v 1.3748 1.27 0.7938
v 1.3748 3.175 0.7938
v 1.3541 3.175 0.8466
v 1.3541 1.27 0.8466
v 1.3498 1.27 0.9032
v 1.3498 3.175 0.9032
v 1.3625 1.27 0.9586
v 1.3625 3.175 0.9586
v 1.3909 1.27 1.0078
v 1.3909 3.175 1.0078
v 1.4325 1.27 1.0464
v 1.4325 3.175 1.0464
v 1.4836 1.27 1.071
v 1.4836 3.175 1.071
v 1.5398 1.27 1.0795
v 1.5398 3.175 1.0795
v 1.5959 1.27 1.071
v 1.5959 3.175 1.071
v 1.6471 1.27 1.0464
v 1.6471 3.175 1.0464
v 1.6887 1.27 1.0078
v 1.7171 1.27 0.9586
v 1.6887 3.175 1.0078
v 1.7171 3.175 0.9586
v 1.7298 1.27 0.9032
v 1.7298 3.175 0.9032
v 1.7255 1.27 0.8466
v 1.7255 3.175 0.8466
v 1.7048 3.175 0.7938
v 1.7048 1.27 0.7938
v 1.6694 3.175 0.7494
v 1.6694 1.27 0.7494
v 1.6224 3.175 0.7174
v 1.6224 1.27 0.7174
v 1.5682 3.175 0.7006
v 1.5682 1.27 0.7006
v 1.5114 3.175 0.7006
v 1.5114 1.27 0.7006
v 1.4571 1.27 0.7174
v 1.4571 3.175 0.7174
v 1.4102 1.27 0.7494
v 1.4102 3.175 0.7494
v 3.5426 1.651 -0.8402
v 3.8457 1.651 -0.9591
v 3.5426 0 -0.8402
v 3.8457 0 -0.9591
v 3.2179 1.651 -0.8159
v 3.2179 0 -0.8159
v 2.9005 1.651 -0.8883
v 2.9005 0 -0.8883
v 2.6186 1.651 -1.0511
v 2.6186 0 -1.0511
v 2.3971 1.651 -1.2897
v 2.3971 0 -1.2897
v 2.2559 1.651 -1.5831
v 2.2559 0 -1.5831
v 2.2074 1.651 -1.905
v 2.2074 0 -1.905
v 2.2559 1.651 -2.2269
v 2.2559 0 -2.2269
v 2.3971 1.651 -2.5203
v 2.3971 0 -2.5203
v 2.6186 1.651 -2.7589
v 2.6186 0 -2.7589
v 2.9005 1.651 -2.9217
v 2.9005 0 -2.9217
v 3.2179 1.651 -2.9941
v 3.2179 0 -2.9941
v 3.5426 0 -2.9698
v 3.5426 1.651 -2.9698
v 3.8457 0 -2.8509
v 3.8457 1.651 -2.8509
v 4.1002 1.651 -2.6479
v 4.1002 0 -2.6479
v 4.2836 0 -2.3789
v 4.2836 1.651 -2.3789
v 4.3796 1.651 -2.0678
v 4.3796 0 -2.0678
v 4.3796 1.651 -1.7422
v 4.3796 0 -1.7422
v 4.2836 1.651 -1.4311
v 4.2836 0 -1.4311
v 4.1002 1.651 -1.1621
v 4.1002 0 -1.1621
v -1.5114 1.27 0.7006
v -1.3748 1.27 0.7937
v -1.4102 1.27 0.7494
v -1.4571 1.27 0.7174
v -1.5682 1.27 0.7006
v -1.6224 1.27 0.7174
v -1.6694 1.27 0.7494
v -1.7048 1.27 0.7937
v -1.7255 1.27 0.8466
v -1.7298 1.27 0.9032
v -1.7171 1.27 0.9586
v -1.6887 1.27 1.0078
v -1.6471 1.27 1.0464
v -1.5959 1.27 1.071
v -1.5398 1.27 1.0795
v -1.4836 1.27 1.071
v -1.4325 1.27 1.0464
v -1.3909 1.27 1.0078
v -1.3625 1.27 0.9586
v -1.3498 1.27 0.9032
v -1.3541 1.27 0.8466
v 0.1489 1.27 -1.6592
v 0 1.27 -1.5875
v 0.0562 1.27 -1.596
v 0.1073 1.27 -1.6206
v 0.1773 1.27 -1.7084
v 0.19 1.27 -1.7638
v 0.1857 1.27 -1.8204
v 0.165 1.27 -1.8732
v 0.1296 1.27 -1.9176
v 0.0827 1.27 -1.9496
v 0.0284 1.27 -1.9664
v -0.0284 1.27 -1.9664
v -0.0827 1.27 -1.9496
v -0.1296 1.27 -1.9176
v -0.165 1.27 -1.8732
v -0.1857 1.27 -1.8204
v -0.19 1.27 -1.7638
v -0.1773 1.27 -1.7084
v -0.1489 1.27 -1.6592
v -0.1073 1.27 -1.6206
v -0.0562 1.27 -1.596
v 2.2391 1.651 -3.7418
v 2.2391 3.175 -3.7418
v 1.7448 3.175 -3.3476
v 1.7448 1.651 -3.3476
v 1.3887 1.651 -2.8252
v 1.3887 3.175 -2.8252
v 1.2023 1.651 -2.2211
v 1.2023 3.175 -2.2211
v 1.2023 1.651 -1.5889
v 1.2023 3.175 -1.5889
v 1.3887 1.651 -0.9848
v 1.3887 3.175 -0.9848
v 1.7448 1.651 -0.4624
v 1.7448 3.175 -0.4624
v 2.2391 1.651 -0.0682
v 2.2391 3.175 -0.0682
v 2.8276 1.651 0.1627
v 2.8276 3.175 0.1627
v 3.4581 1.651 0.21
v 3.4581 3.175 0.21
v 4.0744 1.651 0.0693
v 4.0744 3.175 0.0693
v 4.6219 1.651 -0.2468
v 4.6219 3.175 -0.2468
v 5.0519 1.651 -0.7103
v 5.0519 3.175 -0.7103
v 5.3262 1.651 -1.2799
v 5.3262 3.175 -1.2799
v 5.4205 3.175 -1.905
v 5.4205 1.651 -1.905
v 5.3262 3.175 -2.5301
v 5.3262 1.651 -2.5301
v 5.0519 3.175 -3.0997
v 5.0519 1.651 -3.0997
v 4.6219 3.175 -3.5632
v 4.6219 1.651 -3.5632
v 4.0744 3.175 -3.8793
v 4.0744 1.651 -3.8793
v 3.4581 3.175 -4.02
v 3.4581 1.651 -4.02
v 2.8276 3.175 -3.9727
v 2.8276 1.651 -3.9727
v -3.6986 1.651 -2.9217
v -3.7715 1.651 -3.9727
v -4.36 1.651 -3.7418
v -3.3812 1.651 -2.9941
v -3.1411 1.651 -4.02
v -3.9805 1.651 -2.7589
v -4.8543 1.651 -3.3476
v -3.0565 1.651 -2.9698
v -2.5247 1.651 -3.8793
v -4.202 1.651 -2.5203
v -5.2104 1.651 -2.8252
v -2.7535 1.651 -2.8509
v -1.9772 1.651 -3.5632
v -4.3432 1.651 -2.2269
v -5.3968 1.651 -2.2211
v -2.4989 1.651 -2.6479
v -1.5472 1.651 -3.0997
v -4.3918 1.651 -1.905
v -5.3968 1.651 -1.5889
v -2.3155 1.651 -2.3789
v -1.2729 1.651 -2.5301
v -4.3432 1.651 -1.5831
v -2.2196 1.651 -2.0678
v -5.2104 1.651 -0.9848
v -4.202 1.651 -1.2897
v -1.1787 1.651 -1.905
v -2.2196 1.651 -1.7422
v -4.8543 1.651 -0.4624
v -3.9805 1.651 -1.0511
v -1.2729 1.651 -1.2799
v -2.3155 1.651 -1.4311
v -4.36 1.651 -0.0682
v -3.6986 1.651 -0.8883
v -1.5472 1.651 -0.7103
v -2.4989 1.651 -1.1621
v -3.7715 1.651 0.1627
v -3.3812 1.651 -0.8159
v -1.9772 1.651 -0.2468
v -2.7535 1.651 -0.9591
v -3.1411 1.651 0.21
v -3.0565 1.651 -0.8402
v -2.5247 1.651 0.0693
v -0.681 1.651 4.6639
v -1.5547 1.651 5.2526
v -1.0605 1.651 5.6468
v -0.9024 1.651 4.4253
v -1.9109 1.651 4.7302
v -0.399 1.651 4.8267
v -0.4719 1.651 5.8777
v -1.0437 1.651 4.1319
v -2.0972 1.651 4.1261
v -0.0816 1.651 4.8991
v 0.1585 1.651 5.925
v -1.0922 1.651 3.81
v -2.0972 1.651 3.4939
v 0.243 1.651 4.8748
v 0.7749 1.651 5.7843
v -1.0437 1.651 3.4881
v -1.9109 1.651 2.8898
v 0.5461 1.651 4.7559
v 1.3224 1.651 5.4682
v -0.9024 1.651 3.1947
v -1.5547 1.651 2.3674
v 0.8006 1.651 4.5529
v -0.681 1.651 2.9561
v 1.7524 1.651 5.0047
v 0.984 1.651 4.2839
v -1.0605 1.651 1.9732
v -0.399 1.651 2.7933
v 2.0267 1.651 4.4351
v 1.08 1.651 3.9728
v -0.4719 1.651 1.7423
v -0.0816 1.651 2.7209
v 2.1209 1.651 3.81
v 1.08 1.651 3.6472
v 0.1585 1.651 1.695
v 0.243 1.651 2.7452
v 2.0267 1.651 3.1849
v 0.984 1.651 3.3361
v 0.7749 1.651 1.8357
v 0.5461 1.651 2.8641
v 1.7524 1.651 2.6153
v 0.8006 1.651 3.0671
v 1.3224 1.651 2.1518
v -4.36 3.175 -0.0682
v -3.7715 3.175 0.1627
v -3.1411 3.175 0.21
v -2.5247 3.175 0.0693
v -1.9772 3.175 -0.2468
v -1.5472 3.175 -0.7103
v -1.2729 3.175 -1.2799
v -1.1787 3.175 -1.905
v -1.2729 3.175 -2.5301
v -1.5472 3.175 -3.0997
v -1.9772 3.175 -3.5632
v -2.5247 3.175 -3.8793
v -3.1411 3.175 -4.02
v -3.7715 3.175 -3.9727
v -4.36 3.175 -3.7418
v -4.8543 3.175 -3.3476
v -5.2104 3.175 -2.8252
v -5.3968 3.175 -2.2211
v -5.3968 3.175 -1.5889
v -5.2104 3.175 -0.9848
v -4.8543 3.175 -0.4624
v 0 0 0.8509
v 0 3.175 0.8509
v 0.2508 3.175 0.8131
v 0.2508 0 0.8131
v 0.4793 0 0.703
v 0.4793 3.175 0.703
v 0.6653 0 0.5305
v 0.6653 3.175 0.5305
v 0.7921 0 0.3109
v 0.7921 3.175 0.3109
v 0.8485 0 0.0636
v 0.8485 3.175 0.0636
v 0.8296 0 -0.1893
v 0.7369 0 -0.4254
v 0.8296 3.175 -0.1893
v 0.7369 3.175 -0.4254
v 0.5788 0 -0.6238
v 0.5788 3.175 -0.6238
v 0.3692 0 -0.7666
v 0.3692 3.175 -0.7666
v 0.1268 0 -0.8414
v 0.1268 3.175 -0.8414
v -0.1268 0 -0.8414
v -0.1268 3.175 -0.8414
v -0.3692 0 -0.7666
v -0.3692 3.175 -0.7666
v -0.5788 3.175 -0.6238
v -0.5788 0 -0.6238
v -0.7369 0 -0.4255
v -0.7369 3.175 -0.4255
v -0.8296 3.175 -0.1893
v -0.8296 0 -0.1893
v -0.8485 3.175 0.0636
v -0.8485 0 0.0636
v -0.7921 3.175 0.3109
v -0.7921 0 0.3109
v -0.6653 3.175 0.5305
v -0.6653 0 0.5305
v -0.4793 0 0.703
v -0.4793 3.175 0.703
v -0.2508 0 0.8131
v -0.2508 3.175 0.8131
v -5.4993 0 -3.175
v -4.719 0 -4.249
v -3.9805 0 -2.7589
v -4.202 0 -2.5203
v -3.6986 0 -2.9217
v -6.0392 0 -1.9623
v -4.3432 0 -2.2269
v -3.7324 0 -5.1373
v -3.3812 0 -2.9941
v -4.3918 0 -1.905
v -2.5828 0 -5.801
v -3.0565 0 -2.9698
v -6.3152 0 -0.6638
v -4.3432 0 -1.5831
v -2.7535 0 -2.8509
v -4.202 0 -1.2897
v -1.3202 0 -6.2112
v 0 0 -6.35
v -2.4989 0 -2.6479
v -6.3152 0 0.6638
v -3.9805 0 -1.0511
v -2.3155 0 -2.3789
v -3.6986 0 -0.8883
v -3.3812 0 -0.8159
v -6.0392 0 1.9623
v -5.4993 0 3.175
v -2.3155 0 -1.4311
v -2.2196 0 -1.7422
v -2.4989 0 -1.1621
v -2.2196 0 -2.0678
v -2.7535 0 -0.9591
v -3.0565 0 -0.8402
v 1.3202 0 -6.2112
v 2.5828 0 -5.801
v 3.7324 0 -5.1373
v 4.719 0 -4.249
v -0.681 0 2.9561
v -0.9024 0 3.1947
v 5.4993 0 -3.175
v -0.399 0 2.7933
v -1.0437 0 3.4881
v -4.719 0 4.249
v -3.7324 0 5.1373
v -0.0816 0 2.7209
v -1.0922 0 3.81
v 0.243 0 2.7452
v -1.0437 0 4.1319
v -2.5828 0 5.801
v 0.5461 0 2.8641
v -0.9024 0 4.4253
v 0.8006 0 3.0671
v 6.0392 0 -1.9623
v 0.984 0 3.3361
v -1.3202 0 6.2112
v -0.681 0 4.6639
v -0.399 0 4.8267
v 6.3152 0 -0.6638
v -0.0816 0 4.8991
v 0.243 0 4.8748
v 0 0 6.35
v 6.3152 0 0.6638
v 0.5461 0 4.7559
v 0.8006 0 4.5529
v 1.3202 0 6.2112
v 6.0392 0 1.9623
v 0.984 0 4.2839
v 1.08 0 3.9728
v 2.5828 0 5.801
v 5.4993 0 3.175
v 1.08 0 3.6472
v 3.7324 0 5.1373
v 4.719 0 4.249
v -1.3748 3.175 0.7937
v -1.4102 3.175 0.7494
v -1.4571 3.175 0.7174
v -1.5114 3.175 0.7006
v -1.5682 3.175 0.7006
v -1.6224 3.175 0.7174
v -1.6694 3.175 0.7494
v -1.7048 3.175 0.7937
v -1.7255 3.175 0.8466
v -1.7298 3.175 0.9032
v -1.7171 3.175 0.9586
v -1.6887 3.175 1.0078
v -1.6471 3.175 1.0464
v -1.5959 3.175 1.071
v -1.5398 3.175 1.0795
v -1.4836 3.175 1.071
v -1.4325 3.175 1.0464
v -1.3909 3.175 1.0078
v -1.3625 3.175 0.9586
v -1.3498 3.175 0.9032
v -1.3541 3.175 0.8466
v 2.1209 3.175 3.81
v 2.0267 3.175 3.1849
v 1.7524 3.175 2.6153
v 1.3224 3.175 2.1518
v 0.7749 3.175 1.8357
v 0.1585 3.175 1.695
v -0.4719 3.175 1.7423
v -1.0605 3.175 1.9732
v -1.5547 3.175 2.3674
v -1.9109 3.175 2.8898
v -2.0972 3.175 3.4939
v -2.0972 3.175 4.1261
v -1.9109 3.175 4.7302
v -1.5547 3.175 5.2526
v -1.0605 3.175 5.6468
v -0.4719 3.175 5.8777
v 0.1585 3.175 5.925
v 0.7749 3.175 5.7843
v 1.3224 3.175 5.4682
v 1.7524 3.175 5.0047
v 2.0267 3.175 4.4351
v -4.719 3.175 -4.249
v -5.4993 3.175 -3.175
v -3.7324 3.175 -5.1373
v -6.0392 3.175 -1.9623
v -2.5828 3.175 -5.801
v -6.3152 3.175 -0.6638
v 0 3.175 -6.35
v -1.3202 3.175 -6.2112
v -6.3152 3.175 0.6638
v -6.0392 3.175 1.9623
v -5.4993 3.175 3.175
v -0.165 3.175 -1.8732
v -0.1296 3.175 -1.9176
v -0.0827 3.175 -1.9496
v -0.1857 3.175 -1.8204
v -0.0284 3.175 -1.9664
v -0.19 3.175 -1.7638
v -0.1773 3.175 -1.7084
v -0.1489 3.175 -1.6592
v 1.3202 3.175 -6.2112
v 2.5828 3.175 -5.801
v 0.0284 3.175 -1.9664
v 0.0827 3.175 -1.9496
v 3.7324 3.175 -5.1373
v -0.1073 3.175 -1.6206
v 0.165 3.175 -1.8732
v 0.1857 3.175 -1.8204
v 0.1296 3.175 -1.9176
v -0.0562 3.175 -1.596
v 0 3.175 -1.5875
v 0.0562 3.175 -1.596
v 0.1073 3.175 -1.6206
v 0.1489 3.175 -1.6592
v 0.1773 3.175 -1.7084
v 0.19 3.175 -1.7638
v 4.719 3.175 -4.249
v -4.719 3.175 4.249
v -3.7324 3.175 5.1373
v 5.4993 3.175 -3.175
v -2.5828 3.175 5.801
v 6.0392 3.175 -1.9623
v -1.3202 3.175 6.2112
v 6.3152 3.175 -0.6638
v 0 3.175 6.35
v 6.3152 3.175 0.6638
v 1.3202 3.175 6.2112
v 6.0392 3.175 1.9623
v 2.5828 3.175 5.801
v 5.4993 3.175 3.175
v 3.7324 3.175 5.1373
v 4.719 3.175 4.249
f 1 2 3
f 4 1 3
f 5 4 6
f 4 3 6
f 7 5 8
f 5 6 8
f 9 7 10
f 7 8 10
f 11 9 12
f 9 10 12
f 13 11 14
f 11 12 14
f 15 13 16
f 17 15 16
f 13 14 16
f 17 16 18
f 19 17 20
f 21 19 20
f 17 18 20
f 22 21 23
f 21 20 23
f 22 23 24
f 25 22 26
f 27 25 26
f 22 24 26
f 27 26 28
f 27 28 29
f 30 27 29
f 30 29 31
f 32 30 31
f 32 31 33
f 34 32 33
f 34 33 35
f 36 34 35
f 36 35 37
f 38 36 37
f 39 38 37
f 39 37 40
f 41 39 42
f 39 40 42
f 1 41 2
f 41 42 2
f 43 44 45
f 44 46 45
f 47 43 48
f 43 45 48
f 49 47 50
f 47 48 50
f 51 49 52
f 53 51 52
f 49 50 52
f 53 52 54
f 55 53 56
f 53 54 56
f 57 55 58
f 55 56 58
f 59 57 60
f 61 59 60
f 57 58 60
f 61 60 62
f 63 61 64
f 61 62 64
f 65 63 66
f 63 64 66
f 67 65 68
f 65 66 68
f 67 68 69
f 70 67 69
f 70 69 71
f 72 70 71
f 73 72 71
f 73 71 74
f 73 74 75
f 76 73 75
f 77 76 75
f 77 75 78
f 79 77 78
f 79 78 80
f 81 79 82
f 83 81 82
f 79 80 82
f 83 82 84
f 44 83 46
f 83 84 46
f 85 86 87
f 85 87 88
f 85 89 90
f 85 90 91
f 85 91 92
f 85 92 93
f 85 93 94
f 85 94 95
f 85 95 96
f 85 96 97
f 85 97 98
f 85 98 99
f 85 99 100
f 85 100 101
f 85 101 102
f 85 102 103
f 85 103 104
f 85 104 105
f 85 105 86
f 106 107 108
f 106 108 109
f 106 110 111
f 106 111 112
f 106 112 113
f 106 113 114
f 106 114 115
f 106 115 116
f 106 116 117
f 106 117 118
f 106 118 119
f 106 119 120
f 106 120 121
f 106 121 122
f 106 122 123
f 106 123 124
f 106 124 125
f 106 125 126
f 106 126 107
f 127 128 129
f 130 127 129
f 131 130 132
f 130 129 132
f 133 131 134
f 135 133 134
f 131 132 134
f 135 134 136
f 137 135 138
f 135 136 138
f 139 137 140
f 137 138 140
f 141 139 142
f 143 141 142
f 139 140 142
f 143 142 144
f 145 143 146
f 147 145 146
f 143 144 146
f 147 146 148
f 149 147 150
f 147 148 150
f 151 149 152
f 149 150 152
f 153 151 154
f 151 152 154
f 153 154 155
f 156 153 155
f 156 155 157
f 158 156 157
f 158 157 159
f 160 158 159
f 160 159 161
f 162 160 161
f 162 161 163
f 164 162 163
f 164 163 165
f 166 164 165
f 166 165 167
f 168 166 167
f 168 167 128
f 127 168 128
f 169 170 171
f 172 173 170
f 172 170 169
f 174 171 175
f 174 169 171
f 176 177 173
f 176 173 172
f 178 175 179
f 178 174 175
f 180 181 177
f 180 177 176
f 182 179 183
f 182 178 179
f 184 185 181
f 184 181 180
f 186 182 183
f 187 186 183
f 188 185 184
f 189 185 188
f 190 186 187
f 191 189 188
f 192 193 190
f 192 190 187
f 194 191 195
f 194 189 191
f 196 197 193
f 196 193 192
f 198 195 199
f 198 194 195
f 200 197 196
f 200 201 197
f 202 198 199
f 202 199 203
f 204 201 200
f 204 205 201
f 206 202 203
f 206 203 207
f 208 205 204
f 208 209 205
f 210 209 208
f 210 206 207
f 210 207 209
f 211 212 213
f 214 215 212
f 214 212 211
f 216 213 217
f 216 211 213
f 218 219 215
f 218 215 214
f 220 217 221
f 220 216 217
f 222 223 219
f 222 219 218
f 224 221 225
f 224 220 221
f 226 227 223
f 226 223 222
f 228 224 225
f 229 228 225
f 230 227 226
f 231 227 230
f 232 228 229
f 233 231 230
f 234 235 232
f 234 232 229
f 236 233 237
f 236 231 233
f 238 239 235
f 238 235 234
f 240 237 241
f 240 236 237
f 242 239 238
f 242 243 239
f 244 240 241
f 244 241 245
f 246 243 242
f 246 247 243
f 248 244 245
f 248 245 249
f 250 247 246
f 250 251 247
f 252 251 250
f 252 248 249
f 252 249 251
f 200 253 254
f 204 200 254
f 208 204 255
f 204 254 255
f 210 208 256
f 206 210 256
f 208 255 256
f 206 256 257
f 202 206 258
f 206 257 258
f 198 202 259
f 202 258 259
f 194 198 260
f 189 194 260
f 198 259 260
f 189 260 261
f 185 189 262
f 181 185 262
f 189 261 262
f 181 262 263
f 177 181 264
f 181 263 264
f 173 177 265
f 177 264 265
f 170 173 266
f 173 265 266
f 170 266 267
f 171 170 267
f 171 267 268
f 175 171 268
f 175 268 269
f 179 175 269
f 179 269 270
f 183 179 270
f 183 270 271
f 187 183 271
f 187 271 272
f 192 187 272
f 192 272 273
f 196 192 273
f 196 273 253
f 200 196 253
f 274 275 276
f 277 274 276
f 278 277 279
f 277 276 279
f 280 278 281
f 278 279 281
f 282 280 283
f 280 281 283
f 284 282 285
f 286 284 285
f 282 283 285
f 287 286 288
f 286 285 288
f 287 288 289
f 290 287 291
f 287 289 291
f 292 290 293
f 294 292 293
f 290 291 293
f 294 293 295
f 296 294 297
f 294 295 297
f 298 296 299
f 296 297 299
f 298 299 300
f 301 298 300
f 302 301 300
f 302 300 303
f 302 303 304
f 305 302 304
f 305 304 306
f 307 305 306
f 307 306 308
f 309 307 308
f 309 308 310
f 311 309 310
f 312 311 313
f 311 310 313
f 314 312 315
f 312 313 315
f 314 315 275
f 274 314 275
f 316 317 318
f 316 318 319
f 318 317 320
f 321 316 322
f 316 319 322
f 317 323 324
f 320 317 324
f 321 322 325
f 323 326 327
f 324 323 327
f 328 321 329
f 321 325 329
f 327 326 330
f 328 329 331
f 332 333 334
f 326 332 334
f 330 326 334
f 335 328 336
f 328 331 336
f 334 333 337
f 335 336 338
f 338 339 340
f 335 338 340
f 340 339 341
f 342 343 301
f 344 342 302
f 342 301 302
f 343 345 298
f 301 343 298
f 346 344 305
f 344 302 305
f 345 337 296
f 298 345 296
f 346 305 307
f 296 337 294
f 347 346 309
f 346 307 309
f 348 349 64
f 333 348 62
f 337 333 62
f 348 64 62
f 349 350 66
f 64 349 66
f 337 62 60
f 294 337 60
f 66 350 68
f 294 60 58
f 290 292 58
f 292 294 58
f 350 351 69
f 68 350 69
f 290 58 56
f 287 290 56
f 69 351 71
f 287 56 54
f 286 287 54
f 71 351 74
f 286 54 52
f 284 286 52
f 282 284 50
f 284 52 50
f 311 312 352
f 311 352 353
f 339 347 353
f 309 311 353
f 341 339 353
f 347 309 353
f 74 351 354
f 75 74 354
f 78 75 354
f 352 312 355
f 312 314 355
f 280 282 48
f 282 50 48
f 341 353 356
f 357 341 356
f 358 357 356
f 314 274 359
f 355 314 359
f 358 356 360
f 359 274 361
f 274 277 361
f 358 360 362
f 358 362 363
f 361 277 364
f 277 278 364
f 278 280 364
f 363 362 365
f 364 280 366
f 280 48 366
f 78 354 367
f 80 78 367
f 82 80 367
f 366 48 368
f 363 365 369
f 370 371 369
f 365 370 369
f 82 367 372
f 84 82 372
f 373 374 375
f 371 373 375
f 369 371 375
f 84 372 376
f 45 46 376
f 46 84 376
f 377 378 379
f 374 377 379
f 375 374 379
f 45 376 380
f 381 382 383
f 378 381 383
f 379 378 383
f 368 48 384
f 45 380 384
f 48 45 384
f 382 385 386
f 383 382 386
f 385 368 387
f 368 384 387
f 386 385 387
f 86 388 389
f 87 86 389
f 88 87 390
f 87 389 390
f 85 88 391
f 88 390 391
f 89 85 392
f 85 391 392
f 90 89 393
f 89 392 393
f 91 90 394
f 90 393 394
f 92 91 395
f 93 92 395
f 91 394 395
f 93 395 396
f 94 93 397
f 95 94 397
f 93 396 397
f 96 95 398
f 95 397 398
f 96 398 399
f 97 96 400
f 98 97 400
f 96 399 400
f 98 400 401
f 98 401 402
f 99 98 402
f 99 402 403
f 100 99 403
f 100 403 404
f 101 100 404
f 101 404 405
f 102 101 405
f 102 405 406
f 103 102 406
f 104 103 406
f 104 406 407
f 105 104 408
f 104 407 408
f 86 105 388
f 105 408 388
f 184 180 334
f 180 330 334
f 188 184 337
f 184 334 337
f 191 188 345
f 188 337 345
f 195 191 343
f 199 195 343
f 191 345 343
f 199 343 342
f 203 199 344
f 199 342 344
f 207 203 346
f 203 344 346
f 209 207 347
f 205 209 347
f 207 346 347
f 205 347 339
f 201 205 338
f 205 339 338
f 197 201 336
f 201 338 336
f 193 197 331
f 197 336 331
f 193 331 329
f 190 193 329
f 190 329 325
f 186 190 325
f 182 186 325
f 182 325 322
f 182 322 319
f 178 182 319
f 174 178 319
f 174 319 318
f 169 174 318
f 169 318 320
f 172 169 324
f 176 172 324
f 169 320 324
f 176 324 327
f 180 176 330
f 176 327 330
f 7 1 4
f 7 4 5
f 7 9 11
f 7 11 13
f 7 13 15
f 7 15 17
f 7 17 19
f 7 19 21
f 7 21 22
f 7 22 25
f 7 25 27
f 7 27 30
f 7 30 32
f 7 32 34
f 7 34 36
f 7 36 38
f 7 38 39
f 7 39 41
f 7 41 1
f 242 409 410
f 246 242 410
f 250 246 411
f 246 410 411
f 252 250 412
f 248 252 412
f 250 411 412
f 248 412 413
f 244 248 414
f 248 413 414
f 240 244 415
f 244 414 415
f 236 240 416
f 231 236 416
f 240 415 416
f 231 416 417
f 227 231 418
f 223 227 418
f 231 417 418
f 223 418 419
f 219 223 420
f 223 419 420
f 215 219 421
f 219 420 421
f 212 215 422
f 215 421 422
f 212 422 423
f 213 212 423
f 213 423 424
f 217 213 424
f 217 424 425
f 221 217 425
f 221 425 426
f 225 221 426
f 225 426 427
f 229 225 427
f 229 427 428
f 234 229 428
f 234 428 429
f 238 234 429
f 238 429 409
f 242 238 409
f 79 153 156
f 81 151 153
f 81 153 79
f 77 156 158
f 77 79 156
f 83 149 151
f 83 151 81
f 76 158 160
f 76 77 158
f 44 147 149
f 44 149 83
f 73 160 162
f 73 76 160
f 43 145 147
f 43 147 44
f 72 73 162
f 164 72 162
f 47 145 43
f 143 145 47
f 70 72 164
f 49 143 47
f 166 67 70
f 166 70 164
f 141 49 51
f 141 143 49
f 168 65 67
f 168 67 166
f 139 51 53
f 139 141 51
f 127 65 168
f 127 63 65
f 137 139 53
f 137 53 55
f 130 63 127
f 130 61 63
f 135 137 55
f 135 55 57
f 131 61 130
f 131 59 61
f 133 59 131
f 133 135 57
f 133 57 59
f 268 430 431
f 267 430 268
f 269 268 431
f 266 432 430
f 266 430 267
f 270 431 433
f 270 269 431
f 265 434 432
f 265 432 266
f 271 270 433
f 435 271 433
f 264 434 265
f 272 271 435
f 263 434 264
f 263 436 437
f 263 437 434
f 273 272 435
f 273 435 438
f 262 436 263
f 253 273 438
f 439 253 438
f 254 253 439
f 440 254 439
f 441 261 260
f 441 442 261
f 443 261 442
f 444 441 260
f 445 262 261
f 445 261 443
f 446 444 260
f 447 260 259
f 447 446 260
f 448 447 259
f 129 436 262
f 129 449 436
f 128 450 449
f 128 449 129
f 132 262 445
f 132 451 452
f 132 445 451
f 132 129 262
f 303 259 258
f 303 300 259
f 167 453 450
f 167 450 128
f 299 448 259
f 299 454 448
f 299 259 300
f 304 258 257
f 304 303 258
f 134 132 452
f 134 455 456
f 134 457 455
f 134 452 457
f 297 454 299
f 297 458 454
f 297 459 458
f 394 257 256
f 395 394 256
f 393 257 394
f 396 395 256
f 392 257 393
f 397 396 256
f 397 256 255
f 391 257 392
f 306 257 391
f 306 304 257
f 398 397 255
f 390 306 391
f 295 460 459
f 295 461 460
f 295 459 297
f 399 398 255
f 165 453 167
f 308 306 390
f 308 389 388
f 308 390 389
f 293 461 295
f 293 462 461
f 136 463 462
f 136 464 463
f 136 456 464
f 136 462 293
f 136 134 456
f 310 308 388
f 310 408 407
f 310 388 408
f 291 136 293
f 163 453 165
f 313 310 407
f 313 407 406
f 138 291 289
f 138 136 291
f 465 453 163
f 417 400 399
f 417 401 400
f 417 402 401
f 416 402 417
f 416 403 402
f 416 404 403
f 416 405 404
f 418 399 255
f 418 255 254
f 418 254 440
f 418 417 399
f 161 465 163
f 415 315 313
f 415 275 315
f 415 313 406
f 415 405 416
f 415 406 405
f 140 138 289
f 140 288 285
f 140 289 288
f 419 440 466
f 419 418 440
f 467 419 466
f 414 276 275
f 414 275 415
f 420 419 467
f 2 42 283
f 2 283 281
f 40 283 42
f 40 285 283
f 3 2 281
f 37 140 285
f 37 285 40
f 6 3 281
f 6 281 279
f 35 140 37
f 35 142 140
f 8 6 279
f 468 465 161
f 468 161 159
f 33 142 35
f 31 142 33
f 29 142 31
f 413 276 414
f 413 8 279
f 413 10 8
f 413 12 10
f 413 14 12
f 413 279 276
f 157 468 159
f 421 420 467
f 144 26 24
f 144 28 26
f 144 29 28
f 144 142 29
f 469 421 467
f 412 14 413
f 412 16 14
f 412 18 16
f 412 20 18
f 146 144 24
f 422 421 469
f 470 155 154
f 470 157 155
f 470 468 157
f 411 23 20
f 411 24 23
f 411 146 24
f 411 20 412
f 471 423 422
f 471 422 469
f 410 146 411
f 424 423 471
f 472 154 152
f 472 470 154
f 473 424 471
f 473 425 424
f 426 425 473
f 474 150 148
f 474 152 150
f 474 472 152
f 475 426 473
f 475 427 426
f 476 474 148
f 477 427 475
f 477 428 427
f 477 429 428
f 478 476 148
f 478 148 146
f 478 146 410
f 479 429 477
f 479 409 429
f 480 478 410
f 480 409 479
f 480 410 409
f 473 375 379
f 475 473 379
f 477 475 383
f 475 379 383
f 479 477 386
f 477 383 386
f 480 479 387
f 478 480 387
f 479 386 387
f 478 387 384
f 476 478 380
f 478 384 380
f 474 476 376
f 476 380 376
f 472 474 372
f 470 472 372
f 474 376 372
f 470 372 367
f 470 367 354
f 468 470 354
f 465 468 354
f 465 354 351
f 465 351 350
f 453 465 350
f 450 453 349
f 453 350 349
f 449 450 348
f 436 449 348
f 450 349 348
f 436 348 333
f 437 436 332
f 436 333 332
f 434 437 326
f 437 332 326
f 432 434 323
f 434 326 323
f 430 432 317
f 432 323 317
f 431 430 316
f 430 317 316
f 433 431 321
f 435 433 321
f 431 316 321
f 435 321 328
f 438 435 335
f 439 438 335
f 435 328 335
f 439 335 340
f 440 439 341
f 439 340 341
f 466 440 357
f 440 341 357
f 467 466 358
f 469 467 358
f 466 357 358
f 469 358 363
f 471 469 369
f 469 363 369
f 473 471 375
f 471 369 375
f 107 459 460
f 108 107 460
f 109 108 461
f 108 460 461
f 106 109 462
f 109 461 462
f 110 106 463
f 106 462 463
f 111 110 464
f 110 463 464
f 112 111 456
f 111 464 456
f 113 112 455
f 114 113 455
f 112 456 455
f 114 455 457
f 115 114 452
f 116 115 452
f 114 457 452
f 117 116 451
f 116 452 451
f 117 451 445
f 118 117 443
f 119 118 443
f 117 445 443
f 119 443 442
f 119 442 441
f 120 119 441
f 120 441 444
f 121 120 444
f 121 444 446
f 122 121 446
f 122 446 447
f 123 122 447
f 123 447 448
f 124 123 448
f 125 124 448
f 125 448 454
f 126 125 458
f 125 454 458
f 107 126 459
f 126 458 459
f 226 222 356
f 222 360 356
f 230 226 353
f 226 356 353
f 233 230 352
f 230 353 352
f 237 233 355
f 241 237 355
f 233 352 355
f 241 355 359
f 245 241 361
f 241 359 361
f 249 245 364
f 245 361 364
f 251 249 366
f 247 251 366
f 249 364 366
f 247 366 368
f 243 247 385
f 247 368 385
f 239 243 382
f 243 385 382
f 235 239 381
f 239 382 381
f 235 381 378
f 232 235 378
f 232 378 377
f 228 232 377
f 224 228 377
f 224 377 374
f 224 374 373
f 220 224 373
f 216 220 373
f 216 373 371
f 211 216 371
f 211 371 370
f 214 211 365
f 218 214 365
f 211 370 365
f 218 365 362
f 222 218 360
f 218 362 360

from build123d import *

# Parameters (mm, degrees)
SKETCH1_R                                           = 6.35
BOSS_EXTRUDE1_DEPTH                                 = 3.175
SKETCH5_R                                           = 0.1905
CUT_EXTRUDE3_DEPTH                                  = 1.905
CIRPATTERN3_COUNT                                   = 3
SKETCH6_R                                           = 0.8509
CUT_EXTRUDE4_DEPTH                                  = 3.175
CBORE_FOR_2_BINDING_HEAD_MACHINE_SCREW1_D           = 2.1844
CBORE_FOR_2_BINDING_HEAD_MACHINE_SCREW1_CBORE_D     = 4.2418
CBORE_FOR_2_BINDING_HEAD_MACHINE_SCREW1_CBORE_DEPTH = 1.524
CIRPATTERN4_COUNT                                   = 3


with BuildPart() as part:
    # Sketch1 → Boss-Extrude1 (new body)
    with BuildSketch(Plane(origin=(0, 0, 0), x_dir=(1, 0, 0), z_dir=(0, 1, 0))):
        with Locations(Location((0, 0, 0), (0, 0, 270))):
            Circle(SKETCH1_R)
    extrude(amount=BOSS_EXTRUDE1_DEPTH)

    # Sketch5 → Cut-Extrude3 (cut)
    with BuildSketch(Plane(origin=(0, 3.175, 0), x_dir=(1, 0, 0), z_dir=(0, 1, 0))):
        with Locations(Location((0, 1.778, 0), (0, 0, 270))):
            Circle(SKETCH5_R)
    cut_extrude3 = extrude(amount=-CUT_EXTRUDE3_DEPTH, mode=Mode.SUBTRACT)

    # CirPattern3: Cut-Extrude3 ×3 about axis
    cirpattern3_axis = Axis((0, 0, 0), (0, 1, 0))
    for i in range(1, CIRPATTERN3_COUNT):
        add(cut_extrude3.rotate(cirpattern3_axis, i * 360 / CIRPATTERN3_COUNT), mode=Mode.SUBTRACT)

    # Sketch6 → Cut-Extrude4 (cut)
    with BuildSketch(Plane(origin=(0, 3.175, 0), x_dir=(1, 0, 0), z_dir=(0, 1, 0))):
        with Locations(Location((0, 0, 0), (0, 0, 270))):
            Circle(SKETCH6_R)
    extrude(amount=-CUT_EXTRUDE4_DEPTH, mode=Mode.SUBTRACT)

    # CBORE for #2 Binding Head Machine Screw1 (through all)
    with Locations(Plane(origin=(0, 3.175, 0), x_dir=(1, 0, 0), z_dir=(0, 1, 0))):
        with Locations((0, -3.81)):
            cbore_for_2_binding_head_machine_screw1 = CounterBoreHole(CBORE_FOR_2_BINDING_HEAD_MACHINE_SCREW1_D / 2, CBORE_FOR_2_BINDING_HEAD_MACHINE_SCREW1_CBORE_D / 2, CBORE_FOR_2_BINDING_HEAD_MACHINE_SCREW1_CBORE_DEPTH)

    # CirPattern4: CBORE for #2 Binding Head Machine Screw1 ×3 about axis
    cirpattern4_axis = Axis((0, 0, 0), (0, 1, 0))
    for i in range(1, CIRPATTERN4_COUNT):
        add(cbore_for_2_binding_head_machine_screw1.rotate(cirpattern4_axis, i * 360 / CIRPATTERN4_COUNT), mode=Mode.SUBTRACT)


solid = part.part
